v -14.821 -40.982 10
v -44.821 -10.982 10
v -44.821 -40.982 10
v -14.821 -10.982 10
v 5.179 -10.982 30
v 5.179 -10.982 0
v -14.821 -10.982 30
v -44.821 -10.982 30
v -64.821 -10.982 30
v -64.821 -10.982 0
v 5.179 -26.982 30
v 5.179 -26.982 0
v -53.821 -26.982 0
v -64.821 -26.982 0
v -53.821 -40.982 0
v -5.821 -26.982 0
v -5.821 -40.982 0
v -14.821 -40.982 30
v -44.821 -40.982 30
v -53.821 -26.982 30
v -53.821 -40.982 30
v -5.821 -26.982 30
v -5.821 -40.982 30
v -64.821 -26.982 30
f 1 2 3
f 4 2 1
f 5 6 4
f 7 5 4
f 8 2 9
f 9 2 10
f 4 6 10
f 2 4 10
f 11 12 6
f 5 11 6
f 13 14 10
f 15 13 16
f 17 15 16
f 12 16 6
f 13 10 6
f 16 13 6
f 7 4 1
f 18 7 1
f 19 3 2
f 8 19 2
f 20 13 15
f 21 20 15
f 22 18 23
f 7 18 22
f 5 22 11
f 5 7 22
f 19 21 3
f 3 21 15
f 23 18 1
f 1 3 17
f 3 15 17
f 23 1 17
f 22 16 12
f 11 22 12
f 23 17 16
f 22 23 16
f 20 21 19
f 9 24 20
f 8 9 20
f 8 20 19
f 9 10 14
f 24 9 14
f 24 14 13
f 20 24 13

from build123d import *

# Parameters (mm, degrees)
F0_W     = 30
F0_H     = 30
F1_DEPTH = 10
F2_DEPTH = 30


with BuildPart() as f1:
    # F0 (on Top) → F1 (new body)
    with BuildSketch(Plane.XY):
        with Locations((-29.82143, -25.982142)):
            Rectangle(F0_W, F0_H)
    extrude(amount=F1_DEPTH)

    # F0 (on Top) → F2 (join)
    with BuildSketch(Plane.XY):
        Polygon((-53.82143, -26.982142), (-53.82143, -40.982142), (-44.82143, -40.982142), (-44.82143, -10.982142), (-64.82143, -10.982142), (-64.82143, -26.982142), align=None)
        Polygon((-14.82143, -10.982142), (-14.82143, -40.982142), (-5.82143, -40.982142), (-5.82143, -26.982142), (5.17857, -26.982142), (5.17857, -10.982142), align=None)
    extrude(amount=F2_DEPTH)


solid = f1.part
